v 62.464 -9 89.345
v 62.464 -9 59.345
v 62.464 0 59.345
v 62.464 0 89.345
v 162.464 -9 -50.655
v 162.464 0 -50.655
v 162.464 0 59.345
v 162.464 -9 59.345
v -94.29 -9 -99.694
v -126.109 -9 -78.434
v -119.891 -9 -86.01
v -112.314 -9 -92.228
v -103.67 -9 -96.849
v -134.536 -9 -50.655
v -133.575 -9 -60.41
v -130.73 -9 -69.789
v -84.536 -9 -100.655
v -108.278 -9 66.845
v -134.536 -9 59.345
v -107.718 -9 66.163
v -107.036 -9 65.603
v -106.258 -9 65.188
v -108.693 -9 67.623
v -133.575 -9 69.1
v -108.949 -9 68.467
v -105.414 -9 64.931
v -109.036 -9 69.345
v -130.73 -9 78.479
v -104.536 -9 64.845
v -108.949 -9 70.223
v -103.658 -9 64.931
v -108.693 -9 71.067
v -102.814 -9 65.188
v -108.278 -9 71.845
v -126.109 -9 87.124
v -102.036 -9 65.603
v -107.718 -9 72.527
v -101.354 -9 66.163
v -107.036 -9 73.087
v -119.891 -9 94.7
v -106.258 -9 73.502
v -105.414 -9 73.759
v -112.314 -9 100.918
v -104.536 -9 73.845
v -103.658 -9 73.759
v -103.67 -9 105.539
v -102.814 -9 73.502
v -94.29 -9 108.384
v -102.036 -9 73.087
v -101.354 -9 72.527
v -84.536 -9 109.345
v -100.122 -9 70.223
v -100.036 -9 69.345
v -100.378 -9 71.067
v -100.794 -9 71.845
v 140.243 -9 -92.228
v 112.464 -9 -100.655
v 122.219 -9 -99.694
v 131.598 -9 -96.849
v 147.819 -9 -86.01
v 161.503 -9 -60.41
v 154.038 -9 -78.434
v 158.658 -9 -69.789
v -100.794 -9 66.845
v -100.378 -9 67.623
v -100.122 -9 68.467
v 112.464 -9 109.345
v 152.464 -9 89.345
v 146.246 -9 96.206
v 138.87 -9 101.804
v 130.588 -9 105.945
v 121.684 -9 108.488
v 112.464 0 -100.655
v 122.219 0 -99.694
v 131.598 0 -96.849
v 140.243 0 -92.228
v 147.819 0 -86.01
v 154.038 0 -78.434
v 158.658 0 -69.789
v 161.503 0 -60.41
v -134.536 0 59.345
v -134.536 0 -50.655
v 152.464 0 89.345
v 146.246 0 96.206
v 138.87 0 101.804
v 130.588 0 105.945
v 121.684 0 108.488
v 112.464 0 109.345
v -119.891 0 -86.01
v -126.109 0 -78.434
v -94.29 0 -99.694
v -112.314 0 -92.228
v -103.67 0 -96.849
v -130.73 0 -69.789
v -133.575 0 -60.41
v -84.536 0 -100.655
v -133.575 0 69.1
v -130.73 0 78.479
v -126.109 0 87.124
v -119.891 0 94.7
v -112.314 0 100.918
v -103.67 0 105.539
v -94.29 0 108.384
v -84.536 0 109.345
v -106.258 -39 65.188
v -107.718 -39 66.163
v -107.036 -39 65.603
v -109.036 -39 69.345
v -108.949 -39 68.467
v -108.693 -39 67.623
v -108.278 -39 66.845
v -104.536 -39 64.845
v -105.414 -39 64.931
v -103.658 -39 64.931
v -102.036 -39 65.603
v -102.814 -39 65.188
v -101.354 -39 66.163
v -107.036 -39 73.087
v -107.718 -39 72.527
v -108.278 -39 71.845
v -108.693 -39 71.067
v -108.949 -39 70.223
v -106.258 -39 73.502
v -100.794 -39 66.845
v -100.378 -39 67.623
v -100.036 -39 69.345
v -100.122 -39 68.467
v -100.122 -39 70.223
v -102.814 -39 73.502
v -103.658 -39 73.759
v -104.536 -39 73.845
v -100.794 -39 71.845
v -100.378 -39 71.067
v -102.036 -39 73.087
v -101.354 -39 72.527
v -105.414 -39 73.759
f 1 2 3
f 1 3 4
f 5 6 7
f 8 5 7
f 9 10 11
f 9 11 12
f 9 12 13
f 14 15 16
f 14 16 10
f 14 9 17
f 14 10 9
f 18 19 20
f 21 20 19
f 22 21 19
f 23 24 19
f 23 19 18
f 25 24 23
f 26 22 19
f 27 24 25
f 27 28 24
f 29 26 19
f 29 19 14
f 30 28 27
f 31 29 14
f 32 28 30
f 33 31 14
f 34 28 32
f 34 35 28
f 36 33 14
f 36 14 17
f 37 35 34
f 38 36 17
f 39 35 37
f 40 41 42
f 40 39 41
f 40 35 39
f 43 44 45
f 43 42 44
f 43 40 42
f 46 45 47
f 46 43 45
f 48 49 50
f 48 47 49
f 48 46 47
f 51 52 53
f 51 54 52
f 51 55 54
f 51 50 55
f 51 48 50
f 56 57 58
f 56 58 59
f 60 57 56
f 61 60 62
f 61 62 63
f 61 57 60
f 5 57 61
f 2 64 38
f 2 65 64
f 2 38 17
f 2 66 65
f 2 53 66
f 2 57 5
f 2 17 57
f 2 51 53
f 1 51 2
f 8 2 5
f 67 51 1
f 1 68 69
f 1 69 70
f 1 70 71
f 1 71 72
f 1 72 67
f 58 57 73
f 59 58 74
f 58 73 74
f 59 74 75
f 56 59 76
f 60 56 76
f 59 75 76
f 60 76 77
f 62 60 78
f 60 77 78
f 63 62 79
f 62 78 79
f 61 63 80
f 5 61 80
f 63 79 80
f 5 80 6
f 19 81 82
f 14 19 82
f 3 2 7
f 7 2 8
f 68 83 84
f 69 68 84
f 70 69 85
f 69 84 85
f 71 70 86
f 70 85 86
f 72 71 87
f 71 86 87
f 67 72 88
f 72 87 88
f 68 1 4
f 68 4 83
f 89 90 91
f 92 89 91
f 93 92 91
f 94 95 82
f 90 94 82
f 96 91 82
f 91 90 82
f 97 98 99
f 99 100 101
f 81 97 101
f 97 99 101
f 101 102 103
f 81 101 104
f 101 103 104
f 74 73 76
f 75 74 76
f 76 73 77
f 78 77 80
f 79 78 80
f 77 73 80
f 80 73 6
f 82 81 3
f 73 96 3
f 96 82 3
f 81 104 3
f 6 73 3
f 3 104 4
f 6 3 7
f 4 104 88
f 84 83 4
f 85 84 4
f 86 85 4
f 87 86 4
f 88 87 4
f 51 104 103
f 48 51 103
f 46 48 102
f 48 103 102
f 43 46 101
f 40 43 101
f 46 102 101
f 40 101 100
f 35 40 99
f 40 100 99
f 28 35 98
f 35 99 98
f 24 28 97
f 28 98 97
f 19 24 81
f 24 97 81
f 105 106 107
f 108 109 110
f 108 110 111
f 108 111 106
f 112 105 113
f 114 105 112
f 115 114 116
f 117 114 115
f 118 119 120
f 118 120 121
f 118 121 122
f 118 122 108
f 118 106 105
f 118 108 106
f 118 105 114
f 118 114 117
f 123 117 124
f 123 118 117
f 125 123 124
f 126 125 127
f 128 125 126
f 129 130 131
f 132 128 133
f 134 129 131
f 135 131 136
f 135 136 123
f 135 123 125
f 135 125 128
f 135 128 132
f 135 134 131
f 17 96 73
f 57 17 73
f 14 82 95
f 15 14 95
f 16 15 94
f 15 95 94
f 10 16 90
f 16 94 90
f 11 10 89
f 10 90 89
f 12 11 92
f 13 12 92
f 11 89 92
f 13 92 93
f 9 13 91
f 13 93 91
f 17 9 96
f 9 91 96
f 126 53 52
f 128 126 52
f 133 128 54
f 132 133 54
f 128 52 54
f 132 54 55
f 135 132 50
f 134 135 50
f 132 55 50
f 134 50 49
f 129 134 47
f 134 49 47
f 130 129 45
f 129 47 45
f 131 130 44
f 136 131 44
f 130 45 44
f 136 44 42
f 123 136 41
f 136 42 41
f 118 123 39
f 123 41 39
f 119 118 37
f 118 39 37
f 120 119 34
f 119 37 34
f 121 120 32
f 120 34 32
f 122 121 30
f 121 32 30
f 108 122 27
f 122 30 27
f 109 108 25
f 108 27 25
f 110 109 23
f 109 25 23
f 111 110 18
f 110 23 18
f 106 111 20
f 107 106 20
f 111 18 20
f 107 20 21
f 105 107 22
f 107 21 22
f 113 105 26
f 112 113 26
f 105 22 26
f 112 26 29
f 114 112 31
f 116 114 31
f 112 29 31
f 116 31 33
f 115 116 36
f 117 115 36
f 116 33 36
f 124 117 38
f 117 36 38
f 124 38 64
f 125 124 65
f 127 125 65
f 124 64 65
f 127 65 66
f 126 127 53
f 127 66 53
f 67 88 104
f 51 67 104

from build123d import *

# Parameters (mm, degrees)
F1_DEPTH = 9
F2_R     = 4.5
F3_DEPTH = 30
F5_W     = 100
F5_H     = 30
F6_DEPTH = 25


# Not quite as in the source:
# - the program builds the solid bodies; features that only make, move or delete a surface that nothing else refers to are left out


with BuildPart() as f1:
    # F0 (on Front) → F1 (new body)
    with BuildSketch(Plane.XZ):
        with BuildLine():
            Line((112.4640594495, 109.3449960649), (-84.5359405505, 109.3449960649))
            ThreePointArc((-84.5359405505, 109.3449960649), (-119.8912796099, 94.7003351242), (-134.5359405505, 59.3449960649))
            Line((-134.5359405505, 59.3449960649), (-134.5359405505, -50.6550039351))
            ThreePointArc((-134.5359405505, -50.6550039351), (-119.8912796099, -86.0103429944), (-84.5359405505, -100.6550039351))
            Line((-84.5359405505, -100.6550039351), (112.4640594495, -100.6550039351))
            ThreePointArc((112.4640594495, -100.6550039351), (147.8193985088, -86.0103429944), (162.4640594495, -50.6550039351))
            Line((162.4640594495, -50.6550039351), (162.4640594495, 59.3449960649))
            ThreePointArc((162.4640594495, 59.3449960649), (147.8193985088, 94.7003351242), (112.4640594495, 109.3449960649))
        make_face()
    extrude(amount=F1_DEPTH)

    # F2 (on face) → F3 (join)
    with BuildSketch(Plane.XZ.offset(9)):
        with Locations((-104.5359405505, 69.3449960649)):
            Circle(F2_R)
    extrude(amount=F3_DEPTH)

    # F5 (on face) → F6 (cut)
    with BuildSketch(Plane.XZ.offset(9)):
        with Locations((112.4640594495, 74.3449960649)):
            Rectangle(F5_W, F5_H)
    extrude(amount=-F6_DEPTH, mode=Mode.SUBTRACT)


solid = f1.part
